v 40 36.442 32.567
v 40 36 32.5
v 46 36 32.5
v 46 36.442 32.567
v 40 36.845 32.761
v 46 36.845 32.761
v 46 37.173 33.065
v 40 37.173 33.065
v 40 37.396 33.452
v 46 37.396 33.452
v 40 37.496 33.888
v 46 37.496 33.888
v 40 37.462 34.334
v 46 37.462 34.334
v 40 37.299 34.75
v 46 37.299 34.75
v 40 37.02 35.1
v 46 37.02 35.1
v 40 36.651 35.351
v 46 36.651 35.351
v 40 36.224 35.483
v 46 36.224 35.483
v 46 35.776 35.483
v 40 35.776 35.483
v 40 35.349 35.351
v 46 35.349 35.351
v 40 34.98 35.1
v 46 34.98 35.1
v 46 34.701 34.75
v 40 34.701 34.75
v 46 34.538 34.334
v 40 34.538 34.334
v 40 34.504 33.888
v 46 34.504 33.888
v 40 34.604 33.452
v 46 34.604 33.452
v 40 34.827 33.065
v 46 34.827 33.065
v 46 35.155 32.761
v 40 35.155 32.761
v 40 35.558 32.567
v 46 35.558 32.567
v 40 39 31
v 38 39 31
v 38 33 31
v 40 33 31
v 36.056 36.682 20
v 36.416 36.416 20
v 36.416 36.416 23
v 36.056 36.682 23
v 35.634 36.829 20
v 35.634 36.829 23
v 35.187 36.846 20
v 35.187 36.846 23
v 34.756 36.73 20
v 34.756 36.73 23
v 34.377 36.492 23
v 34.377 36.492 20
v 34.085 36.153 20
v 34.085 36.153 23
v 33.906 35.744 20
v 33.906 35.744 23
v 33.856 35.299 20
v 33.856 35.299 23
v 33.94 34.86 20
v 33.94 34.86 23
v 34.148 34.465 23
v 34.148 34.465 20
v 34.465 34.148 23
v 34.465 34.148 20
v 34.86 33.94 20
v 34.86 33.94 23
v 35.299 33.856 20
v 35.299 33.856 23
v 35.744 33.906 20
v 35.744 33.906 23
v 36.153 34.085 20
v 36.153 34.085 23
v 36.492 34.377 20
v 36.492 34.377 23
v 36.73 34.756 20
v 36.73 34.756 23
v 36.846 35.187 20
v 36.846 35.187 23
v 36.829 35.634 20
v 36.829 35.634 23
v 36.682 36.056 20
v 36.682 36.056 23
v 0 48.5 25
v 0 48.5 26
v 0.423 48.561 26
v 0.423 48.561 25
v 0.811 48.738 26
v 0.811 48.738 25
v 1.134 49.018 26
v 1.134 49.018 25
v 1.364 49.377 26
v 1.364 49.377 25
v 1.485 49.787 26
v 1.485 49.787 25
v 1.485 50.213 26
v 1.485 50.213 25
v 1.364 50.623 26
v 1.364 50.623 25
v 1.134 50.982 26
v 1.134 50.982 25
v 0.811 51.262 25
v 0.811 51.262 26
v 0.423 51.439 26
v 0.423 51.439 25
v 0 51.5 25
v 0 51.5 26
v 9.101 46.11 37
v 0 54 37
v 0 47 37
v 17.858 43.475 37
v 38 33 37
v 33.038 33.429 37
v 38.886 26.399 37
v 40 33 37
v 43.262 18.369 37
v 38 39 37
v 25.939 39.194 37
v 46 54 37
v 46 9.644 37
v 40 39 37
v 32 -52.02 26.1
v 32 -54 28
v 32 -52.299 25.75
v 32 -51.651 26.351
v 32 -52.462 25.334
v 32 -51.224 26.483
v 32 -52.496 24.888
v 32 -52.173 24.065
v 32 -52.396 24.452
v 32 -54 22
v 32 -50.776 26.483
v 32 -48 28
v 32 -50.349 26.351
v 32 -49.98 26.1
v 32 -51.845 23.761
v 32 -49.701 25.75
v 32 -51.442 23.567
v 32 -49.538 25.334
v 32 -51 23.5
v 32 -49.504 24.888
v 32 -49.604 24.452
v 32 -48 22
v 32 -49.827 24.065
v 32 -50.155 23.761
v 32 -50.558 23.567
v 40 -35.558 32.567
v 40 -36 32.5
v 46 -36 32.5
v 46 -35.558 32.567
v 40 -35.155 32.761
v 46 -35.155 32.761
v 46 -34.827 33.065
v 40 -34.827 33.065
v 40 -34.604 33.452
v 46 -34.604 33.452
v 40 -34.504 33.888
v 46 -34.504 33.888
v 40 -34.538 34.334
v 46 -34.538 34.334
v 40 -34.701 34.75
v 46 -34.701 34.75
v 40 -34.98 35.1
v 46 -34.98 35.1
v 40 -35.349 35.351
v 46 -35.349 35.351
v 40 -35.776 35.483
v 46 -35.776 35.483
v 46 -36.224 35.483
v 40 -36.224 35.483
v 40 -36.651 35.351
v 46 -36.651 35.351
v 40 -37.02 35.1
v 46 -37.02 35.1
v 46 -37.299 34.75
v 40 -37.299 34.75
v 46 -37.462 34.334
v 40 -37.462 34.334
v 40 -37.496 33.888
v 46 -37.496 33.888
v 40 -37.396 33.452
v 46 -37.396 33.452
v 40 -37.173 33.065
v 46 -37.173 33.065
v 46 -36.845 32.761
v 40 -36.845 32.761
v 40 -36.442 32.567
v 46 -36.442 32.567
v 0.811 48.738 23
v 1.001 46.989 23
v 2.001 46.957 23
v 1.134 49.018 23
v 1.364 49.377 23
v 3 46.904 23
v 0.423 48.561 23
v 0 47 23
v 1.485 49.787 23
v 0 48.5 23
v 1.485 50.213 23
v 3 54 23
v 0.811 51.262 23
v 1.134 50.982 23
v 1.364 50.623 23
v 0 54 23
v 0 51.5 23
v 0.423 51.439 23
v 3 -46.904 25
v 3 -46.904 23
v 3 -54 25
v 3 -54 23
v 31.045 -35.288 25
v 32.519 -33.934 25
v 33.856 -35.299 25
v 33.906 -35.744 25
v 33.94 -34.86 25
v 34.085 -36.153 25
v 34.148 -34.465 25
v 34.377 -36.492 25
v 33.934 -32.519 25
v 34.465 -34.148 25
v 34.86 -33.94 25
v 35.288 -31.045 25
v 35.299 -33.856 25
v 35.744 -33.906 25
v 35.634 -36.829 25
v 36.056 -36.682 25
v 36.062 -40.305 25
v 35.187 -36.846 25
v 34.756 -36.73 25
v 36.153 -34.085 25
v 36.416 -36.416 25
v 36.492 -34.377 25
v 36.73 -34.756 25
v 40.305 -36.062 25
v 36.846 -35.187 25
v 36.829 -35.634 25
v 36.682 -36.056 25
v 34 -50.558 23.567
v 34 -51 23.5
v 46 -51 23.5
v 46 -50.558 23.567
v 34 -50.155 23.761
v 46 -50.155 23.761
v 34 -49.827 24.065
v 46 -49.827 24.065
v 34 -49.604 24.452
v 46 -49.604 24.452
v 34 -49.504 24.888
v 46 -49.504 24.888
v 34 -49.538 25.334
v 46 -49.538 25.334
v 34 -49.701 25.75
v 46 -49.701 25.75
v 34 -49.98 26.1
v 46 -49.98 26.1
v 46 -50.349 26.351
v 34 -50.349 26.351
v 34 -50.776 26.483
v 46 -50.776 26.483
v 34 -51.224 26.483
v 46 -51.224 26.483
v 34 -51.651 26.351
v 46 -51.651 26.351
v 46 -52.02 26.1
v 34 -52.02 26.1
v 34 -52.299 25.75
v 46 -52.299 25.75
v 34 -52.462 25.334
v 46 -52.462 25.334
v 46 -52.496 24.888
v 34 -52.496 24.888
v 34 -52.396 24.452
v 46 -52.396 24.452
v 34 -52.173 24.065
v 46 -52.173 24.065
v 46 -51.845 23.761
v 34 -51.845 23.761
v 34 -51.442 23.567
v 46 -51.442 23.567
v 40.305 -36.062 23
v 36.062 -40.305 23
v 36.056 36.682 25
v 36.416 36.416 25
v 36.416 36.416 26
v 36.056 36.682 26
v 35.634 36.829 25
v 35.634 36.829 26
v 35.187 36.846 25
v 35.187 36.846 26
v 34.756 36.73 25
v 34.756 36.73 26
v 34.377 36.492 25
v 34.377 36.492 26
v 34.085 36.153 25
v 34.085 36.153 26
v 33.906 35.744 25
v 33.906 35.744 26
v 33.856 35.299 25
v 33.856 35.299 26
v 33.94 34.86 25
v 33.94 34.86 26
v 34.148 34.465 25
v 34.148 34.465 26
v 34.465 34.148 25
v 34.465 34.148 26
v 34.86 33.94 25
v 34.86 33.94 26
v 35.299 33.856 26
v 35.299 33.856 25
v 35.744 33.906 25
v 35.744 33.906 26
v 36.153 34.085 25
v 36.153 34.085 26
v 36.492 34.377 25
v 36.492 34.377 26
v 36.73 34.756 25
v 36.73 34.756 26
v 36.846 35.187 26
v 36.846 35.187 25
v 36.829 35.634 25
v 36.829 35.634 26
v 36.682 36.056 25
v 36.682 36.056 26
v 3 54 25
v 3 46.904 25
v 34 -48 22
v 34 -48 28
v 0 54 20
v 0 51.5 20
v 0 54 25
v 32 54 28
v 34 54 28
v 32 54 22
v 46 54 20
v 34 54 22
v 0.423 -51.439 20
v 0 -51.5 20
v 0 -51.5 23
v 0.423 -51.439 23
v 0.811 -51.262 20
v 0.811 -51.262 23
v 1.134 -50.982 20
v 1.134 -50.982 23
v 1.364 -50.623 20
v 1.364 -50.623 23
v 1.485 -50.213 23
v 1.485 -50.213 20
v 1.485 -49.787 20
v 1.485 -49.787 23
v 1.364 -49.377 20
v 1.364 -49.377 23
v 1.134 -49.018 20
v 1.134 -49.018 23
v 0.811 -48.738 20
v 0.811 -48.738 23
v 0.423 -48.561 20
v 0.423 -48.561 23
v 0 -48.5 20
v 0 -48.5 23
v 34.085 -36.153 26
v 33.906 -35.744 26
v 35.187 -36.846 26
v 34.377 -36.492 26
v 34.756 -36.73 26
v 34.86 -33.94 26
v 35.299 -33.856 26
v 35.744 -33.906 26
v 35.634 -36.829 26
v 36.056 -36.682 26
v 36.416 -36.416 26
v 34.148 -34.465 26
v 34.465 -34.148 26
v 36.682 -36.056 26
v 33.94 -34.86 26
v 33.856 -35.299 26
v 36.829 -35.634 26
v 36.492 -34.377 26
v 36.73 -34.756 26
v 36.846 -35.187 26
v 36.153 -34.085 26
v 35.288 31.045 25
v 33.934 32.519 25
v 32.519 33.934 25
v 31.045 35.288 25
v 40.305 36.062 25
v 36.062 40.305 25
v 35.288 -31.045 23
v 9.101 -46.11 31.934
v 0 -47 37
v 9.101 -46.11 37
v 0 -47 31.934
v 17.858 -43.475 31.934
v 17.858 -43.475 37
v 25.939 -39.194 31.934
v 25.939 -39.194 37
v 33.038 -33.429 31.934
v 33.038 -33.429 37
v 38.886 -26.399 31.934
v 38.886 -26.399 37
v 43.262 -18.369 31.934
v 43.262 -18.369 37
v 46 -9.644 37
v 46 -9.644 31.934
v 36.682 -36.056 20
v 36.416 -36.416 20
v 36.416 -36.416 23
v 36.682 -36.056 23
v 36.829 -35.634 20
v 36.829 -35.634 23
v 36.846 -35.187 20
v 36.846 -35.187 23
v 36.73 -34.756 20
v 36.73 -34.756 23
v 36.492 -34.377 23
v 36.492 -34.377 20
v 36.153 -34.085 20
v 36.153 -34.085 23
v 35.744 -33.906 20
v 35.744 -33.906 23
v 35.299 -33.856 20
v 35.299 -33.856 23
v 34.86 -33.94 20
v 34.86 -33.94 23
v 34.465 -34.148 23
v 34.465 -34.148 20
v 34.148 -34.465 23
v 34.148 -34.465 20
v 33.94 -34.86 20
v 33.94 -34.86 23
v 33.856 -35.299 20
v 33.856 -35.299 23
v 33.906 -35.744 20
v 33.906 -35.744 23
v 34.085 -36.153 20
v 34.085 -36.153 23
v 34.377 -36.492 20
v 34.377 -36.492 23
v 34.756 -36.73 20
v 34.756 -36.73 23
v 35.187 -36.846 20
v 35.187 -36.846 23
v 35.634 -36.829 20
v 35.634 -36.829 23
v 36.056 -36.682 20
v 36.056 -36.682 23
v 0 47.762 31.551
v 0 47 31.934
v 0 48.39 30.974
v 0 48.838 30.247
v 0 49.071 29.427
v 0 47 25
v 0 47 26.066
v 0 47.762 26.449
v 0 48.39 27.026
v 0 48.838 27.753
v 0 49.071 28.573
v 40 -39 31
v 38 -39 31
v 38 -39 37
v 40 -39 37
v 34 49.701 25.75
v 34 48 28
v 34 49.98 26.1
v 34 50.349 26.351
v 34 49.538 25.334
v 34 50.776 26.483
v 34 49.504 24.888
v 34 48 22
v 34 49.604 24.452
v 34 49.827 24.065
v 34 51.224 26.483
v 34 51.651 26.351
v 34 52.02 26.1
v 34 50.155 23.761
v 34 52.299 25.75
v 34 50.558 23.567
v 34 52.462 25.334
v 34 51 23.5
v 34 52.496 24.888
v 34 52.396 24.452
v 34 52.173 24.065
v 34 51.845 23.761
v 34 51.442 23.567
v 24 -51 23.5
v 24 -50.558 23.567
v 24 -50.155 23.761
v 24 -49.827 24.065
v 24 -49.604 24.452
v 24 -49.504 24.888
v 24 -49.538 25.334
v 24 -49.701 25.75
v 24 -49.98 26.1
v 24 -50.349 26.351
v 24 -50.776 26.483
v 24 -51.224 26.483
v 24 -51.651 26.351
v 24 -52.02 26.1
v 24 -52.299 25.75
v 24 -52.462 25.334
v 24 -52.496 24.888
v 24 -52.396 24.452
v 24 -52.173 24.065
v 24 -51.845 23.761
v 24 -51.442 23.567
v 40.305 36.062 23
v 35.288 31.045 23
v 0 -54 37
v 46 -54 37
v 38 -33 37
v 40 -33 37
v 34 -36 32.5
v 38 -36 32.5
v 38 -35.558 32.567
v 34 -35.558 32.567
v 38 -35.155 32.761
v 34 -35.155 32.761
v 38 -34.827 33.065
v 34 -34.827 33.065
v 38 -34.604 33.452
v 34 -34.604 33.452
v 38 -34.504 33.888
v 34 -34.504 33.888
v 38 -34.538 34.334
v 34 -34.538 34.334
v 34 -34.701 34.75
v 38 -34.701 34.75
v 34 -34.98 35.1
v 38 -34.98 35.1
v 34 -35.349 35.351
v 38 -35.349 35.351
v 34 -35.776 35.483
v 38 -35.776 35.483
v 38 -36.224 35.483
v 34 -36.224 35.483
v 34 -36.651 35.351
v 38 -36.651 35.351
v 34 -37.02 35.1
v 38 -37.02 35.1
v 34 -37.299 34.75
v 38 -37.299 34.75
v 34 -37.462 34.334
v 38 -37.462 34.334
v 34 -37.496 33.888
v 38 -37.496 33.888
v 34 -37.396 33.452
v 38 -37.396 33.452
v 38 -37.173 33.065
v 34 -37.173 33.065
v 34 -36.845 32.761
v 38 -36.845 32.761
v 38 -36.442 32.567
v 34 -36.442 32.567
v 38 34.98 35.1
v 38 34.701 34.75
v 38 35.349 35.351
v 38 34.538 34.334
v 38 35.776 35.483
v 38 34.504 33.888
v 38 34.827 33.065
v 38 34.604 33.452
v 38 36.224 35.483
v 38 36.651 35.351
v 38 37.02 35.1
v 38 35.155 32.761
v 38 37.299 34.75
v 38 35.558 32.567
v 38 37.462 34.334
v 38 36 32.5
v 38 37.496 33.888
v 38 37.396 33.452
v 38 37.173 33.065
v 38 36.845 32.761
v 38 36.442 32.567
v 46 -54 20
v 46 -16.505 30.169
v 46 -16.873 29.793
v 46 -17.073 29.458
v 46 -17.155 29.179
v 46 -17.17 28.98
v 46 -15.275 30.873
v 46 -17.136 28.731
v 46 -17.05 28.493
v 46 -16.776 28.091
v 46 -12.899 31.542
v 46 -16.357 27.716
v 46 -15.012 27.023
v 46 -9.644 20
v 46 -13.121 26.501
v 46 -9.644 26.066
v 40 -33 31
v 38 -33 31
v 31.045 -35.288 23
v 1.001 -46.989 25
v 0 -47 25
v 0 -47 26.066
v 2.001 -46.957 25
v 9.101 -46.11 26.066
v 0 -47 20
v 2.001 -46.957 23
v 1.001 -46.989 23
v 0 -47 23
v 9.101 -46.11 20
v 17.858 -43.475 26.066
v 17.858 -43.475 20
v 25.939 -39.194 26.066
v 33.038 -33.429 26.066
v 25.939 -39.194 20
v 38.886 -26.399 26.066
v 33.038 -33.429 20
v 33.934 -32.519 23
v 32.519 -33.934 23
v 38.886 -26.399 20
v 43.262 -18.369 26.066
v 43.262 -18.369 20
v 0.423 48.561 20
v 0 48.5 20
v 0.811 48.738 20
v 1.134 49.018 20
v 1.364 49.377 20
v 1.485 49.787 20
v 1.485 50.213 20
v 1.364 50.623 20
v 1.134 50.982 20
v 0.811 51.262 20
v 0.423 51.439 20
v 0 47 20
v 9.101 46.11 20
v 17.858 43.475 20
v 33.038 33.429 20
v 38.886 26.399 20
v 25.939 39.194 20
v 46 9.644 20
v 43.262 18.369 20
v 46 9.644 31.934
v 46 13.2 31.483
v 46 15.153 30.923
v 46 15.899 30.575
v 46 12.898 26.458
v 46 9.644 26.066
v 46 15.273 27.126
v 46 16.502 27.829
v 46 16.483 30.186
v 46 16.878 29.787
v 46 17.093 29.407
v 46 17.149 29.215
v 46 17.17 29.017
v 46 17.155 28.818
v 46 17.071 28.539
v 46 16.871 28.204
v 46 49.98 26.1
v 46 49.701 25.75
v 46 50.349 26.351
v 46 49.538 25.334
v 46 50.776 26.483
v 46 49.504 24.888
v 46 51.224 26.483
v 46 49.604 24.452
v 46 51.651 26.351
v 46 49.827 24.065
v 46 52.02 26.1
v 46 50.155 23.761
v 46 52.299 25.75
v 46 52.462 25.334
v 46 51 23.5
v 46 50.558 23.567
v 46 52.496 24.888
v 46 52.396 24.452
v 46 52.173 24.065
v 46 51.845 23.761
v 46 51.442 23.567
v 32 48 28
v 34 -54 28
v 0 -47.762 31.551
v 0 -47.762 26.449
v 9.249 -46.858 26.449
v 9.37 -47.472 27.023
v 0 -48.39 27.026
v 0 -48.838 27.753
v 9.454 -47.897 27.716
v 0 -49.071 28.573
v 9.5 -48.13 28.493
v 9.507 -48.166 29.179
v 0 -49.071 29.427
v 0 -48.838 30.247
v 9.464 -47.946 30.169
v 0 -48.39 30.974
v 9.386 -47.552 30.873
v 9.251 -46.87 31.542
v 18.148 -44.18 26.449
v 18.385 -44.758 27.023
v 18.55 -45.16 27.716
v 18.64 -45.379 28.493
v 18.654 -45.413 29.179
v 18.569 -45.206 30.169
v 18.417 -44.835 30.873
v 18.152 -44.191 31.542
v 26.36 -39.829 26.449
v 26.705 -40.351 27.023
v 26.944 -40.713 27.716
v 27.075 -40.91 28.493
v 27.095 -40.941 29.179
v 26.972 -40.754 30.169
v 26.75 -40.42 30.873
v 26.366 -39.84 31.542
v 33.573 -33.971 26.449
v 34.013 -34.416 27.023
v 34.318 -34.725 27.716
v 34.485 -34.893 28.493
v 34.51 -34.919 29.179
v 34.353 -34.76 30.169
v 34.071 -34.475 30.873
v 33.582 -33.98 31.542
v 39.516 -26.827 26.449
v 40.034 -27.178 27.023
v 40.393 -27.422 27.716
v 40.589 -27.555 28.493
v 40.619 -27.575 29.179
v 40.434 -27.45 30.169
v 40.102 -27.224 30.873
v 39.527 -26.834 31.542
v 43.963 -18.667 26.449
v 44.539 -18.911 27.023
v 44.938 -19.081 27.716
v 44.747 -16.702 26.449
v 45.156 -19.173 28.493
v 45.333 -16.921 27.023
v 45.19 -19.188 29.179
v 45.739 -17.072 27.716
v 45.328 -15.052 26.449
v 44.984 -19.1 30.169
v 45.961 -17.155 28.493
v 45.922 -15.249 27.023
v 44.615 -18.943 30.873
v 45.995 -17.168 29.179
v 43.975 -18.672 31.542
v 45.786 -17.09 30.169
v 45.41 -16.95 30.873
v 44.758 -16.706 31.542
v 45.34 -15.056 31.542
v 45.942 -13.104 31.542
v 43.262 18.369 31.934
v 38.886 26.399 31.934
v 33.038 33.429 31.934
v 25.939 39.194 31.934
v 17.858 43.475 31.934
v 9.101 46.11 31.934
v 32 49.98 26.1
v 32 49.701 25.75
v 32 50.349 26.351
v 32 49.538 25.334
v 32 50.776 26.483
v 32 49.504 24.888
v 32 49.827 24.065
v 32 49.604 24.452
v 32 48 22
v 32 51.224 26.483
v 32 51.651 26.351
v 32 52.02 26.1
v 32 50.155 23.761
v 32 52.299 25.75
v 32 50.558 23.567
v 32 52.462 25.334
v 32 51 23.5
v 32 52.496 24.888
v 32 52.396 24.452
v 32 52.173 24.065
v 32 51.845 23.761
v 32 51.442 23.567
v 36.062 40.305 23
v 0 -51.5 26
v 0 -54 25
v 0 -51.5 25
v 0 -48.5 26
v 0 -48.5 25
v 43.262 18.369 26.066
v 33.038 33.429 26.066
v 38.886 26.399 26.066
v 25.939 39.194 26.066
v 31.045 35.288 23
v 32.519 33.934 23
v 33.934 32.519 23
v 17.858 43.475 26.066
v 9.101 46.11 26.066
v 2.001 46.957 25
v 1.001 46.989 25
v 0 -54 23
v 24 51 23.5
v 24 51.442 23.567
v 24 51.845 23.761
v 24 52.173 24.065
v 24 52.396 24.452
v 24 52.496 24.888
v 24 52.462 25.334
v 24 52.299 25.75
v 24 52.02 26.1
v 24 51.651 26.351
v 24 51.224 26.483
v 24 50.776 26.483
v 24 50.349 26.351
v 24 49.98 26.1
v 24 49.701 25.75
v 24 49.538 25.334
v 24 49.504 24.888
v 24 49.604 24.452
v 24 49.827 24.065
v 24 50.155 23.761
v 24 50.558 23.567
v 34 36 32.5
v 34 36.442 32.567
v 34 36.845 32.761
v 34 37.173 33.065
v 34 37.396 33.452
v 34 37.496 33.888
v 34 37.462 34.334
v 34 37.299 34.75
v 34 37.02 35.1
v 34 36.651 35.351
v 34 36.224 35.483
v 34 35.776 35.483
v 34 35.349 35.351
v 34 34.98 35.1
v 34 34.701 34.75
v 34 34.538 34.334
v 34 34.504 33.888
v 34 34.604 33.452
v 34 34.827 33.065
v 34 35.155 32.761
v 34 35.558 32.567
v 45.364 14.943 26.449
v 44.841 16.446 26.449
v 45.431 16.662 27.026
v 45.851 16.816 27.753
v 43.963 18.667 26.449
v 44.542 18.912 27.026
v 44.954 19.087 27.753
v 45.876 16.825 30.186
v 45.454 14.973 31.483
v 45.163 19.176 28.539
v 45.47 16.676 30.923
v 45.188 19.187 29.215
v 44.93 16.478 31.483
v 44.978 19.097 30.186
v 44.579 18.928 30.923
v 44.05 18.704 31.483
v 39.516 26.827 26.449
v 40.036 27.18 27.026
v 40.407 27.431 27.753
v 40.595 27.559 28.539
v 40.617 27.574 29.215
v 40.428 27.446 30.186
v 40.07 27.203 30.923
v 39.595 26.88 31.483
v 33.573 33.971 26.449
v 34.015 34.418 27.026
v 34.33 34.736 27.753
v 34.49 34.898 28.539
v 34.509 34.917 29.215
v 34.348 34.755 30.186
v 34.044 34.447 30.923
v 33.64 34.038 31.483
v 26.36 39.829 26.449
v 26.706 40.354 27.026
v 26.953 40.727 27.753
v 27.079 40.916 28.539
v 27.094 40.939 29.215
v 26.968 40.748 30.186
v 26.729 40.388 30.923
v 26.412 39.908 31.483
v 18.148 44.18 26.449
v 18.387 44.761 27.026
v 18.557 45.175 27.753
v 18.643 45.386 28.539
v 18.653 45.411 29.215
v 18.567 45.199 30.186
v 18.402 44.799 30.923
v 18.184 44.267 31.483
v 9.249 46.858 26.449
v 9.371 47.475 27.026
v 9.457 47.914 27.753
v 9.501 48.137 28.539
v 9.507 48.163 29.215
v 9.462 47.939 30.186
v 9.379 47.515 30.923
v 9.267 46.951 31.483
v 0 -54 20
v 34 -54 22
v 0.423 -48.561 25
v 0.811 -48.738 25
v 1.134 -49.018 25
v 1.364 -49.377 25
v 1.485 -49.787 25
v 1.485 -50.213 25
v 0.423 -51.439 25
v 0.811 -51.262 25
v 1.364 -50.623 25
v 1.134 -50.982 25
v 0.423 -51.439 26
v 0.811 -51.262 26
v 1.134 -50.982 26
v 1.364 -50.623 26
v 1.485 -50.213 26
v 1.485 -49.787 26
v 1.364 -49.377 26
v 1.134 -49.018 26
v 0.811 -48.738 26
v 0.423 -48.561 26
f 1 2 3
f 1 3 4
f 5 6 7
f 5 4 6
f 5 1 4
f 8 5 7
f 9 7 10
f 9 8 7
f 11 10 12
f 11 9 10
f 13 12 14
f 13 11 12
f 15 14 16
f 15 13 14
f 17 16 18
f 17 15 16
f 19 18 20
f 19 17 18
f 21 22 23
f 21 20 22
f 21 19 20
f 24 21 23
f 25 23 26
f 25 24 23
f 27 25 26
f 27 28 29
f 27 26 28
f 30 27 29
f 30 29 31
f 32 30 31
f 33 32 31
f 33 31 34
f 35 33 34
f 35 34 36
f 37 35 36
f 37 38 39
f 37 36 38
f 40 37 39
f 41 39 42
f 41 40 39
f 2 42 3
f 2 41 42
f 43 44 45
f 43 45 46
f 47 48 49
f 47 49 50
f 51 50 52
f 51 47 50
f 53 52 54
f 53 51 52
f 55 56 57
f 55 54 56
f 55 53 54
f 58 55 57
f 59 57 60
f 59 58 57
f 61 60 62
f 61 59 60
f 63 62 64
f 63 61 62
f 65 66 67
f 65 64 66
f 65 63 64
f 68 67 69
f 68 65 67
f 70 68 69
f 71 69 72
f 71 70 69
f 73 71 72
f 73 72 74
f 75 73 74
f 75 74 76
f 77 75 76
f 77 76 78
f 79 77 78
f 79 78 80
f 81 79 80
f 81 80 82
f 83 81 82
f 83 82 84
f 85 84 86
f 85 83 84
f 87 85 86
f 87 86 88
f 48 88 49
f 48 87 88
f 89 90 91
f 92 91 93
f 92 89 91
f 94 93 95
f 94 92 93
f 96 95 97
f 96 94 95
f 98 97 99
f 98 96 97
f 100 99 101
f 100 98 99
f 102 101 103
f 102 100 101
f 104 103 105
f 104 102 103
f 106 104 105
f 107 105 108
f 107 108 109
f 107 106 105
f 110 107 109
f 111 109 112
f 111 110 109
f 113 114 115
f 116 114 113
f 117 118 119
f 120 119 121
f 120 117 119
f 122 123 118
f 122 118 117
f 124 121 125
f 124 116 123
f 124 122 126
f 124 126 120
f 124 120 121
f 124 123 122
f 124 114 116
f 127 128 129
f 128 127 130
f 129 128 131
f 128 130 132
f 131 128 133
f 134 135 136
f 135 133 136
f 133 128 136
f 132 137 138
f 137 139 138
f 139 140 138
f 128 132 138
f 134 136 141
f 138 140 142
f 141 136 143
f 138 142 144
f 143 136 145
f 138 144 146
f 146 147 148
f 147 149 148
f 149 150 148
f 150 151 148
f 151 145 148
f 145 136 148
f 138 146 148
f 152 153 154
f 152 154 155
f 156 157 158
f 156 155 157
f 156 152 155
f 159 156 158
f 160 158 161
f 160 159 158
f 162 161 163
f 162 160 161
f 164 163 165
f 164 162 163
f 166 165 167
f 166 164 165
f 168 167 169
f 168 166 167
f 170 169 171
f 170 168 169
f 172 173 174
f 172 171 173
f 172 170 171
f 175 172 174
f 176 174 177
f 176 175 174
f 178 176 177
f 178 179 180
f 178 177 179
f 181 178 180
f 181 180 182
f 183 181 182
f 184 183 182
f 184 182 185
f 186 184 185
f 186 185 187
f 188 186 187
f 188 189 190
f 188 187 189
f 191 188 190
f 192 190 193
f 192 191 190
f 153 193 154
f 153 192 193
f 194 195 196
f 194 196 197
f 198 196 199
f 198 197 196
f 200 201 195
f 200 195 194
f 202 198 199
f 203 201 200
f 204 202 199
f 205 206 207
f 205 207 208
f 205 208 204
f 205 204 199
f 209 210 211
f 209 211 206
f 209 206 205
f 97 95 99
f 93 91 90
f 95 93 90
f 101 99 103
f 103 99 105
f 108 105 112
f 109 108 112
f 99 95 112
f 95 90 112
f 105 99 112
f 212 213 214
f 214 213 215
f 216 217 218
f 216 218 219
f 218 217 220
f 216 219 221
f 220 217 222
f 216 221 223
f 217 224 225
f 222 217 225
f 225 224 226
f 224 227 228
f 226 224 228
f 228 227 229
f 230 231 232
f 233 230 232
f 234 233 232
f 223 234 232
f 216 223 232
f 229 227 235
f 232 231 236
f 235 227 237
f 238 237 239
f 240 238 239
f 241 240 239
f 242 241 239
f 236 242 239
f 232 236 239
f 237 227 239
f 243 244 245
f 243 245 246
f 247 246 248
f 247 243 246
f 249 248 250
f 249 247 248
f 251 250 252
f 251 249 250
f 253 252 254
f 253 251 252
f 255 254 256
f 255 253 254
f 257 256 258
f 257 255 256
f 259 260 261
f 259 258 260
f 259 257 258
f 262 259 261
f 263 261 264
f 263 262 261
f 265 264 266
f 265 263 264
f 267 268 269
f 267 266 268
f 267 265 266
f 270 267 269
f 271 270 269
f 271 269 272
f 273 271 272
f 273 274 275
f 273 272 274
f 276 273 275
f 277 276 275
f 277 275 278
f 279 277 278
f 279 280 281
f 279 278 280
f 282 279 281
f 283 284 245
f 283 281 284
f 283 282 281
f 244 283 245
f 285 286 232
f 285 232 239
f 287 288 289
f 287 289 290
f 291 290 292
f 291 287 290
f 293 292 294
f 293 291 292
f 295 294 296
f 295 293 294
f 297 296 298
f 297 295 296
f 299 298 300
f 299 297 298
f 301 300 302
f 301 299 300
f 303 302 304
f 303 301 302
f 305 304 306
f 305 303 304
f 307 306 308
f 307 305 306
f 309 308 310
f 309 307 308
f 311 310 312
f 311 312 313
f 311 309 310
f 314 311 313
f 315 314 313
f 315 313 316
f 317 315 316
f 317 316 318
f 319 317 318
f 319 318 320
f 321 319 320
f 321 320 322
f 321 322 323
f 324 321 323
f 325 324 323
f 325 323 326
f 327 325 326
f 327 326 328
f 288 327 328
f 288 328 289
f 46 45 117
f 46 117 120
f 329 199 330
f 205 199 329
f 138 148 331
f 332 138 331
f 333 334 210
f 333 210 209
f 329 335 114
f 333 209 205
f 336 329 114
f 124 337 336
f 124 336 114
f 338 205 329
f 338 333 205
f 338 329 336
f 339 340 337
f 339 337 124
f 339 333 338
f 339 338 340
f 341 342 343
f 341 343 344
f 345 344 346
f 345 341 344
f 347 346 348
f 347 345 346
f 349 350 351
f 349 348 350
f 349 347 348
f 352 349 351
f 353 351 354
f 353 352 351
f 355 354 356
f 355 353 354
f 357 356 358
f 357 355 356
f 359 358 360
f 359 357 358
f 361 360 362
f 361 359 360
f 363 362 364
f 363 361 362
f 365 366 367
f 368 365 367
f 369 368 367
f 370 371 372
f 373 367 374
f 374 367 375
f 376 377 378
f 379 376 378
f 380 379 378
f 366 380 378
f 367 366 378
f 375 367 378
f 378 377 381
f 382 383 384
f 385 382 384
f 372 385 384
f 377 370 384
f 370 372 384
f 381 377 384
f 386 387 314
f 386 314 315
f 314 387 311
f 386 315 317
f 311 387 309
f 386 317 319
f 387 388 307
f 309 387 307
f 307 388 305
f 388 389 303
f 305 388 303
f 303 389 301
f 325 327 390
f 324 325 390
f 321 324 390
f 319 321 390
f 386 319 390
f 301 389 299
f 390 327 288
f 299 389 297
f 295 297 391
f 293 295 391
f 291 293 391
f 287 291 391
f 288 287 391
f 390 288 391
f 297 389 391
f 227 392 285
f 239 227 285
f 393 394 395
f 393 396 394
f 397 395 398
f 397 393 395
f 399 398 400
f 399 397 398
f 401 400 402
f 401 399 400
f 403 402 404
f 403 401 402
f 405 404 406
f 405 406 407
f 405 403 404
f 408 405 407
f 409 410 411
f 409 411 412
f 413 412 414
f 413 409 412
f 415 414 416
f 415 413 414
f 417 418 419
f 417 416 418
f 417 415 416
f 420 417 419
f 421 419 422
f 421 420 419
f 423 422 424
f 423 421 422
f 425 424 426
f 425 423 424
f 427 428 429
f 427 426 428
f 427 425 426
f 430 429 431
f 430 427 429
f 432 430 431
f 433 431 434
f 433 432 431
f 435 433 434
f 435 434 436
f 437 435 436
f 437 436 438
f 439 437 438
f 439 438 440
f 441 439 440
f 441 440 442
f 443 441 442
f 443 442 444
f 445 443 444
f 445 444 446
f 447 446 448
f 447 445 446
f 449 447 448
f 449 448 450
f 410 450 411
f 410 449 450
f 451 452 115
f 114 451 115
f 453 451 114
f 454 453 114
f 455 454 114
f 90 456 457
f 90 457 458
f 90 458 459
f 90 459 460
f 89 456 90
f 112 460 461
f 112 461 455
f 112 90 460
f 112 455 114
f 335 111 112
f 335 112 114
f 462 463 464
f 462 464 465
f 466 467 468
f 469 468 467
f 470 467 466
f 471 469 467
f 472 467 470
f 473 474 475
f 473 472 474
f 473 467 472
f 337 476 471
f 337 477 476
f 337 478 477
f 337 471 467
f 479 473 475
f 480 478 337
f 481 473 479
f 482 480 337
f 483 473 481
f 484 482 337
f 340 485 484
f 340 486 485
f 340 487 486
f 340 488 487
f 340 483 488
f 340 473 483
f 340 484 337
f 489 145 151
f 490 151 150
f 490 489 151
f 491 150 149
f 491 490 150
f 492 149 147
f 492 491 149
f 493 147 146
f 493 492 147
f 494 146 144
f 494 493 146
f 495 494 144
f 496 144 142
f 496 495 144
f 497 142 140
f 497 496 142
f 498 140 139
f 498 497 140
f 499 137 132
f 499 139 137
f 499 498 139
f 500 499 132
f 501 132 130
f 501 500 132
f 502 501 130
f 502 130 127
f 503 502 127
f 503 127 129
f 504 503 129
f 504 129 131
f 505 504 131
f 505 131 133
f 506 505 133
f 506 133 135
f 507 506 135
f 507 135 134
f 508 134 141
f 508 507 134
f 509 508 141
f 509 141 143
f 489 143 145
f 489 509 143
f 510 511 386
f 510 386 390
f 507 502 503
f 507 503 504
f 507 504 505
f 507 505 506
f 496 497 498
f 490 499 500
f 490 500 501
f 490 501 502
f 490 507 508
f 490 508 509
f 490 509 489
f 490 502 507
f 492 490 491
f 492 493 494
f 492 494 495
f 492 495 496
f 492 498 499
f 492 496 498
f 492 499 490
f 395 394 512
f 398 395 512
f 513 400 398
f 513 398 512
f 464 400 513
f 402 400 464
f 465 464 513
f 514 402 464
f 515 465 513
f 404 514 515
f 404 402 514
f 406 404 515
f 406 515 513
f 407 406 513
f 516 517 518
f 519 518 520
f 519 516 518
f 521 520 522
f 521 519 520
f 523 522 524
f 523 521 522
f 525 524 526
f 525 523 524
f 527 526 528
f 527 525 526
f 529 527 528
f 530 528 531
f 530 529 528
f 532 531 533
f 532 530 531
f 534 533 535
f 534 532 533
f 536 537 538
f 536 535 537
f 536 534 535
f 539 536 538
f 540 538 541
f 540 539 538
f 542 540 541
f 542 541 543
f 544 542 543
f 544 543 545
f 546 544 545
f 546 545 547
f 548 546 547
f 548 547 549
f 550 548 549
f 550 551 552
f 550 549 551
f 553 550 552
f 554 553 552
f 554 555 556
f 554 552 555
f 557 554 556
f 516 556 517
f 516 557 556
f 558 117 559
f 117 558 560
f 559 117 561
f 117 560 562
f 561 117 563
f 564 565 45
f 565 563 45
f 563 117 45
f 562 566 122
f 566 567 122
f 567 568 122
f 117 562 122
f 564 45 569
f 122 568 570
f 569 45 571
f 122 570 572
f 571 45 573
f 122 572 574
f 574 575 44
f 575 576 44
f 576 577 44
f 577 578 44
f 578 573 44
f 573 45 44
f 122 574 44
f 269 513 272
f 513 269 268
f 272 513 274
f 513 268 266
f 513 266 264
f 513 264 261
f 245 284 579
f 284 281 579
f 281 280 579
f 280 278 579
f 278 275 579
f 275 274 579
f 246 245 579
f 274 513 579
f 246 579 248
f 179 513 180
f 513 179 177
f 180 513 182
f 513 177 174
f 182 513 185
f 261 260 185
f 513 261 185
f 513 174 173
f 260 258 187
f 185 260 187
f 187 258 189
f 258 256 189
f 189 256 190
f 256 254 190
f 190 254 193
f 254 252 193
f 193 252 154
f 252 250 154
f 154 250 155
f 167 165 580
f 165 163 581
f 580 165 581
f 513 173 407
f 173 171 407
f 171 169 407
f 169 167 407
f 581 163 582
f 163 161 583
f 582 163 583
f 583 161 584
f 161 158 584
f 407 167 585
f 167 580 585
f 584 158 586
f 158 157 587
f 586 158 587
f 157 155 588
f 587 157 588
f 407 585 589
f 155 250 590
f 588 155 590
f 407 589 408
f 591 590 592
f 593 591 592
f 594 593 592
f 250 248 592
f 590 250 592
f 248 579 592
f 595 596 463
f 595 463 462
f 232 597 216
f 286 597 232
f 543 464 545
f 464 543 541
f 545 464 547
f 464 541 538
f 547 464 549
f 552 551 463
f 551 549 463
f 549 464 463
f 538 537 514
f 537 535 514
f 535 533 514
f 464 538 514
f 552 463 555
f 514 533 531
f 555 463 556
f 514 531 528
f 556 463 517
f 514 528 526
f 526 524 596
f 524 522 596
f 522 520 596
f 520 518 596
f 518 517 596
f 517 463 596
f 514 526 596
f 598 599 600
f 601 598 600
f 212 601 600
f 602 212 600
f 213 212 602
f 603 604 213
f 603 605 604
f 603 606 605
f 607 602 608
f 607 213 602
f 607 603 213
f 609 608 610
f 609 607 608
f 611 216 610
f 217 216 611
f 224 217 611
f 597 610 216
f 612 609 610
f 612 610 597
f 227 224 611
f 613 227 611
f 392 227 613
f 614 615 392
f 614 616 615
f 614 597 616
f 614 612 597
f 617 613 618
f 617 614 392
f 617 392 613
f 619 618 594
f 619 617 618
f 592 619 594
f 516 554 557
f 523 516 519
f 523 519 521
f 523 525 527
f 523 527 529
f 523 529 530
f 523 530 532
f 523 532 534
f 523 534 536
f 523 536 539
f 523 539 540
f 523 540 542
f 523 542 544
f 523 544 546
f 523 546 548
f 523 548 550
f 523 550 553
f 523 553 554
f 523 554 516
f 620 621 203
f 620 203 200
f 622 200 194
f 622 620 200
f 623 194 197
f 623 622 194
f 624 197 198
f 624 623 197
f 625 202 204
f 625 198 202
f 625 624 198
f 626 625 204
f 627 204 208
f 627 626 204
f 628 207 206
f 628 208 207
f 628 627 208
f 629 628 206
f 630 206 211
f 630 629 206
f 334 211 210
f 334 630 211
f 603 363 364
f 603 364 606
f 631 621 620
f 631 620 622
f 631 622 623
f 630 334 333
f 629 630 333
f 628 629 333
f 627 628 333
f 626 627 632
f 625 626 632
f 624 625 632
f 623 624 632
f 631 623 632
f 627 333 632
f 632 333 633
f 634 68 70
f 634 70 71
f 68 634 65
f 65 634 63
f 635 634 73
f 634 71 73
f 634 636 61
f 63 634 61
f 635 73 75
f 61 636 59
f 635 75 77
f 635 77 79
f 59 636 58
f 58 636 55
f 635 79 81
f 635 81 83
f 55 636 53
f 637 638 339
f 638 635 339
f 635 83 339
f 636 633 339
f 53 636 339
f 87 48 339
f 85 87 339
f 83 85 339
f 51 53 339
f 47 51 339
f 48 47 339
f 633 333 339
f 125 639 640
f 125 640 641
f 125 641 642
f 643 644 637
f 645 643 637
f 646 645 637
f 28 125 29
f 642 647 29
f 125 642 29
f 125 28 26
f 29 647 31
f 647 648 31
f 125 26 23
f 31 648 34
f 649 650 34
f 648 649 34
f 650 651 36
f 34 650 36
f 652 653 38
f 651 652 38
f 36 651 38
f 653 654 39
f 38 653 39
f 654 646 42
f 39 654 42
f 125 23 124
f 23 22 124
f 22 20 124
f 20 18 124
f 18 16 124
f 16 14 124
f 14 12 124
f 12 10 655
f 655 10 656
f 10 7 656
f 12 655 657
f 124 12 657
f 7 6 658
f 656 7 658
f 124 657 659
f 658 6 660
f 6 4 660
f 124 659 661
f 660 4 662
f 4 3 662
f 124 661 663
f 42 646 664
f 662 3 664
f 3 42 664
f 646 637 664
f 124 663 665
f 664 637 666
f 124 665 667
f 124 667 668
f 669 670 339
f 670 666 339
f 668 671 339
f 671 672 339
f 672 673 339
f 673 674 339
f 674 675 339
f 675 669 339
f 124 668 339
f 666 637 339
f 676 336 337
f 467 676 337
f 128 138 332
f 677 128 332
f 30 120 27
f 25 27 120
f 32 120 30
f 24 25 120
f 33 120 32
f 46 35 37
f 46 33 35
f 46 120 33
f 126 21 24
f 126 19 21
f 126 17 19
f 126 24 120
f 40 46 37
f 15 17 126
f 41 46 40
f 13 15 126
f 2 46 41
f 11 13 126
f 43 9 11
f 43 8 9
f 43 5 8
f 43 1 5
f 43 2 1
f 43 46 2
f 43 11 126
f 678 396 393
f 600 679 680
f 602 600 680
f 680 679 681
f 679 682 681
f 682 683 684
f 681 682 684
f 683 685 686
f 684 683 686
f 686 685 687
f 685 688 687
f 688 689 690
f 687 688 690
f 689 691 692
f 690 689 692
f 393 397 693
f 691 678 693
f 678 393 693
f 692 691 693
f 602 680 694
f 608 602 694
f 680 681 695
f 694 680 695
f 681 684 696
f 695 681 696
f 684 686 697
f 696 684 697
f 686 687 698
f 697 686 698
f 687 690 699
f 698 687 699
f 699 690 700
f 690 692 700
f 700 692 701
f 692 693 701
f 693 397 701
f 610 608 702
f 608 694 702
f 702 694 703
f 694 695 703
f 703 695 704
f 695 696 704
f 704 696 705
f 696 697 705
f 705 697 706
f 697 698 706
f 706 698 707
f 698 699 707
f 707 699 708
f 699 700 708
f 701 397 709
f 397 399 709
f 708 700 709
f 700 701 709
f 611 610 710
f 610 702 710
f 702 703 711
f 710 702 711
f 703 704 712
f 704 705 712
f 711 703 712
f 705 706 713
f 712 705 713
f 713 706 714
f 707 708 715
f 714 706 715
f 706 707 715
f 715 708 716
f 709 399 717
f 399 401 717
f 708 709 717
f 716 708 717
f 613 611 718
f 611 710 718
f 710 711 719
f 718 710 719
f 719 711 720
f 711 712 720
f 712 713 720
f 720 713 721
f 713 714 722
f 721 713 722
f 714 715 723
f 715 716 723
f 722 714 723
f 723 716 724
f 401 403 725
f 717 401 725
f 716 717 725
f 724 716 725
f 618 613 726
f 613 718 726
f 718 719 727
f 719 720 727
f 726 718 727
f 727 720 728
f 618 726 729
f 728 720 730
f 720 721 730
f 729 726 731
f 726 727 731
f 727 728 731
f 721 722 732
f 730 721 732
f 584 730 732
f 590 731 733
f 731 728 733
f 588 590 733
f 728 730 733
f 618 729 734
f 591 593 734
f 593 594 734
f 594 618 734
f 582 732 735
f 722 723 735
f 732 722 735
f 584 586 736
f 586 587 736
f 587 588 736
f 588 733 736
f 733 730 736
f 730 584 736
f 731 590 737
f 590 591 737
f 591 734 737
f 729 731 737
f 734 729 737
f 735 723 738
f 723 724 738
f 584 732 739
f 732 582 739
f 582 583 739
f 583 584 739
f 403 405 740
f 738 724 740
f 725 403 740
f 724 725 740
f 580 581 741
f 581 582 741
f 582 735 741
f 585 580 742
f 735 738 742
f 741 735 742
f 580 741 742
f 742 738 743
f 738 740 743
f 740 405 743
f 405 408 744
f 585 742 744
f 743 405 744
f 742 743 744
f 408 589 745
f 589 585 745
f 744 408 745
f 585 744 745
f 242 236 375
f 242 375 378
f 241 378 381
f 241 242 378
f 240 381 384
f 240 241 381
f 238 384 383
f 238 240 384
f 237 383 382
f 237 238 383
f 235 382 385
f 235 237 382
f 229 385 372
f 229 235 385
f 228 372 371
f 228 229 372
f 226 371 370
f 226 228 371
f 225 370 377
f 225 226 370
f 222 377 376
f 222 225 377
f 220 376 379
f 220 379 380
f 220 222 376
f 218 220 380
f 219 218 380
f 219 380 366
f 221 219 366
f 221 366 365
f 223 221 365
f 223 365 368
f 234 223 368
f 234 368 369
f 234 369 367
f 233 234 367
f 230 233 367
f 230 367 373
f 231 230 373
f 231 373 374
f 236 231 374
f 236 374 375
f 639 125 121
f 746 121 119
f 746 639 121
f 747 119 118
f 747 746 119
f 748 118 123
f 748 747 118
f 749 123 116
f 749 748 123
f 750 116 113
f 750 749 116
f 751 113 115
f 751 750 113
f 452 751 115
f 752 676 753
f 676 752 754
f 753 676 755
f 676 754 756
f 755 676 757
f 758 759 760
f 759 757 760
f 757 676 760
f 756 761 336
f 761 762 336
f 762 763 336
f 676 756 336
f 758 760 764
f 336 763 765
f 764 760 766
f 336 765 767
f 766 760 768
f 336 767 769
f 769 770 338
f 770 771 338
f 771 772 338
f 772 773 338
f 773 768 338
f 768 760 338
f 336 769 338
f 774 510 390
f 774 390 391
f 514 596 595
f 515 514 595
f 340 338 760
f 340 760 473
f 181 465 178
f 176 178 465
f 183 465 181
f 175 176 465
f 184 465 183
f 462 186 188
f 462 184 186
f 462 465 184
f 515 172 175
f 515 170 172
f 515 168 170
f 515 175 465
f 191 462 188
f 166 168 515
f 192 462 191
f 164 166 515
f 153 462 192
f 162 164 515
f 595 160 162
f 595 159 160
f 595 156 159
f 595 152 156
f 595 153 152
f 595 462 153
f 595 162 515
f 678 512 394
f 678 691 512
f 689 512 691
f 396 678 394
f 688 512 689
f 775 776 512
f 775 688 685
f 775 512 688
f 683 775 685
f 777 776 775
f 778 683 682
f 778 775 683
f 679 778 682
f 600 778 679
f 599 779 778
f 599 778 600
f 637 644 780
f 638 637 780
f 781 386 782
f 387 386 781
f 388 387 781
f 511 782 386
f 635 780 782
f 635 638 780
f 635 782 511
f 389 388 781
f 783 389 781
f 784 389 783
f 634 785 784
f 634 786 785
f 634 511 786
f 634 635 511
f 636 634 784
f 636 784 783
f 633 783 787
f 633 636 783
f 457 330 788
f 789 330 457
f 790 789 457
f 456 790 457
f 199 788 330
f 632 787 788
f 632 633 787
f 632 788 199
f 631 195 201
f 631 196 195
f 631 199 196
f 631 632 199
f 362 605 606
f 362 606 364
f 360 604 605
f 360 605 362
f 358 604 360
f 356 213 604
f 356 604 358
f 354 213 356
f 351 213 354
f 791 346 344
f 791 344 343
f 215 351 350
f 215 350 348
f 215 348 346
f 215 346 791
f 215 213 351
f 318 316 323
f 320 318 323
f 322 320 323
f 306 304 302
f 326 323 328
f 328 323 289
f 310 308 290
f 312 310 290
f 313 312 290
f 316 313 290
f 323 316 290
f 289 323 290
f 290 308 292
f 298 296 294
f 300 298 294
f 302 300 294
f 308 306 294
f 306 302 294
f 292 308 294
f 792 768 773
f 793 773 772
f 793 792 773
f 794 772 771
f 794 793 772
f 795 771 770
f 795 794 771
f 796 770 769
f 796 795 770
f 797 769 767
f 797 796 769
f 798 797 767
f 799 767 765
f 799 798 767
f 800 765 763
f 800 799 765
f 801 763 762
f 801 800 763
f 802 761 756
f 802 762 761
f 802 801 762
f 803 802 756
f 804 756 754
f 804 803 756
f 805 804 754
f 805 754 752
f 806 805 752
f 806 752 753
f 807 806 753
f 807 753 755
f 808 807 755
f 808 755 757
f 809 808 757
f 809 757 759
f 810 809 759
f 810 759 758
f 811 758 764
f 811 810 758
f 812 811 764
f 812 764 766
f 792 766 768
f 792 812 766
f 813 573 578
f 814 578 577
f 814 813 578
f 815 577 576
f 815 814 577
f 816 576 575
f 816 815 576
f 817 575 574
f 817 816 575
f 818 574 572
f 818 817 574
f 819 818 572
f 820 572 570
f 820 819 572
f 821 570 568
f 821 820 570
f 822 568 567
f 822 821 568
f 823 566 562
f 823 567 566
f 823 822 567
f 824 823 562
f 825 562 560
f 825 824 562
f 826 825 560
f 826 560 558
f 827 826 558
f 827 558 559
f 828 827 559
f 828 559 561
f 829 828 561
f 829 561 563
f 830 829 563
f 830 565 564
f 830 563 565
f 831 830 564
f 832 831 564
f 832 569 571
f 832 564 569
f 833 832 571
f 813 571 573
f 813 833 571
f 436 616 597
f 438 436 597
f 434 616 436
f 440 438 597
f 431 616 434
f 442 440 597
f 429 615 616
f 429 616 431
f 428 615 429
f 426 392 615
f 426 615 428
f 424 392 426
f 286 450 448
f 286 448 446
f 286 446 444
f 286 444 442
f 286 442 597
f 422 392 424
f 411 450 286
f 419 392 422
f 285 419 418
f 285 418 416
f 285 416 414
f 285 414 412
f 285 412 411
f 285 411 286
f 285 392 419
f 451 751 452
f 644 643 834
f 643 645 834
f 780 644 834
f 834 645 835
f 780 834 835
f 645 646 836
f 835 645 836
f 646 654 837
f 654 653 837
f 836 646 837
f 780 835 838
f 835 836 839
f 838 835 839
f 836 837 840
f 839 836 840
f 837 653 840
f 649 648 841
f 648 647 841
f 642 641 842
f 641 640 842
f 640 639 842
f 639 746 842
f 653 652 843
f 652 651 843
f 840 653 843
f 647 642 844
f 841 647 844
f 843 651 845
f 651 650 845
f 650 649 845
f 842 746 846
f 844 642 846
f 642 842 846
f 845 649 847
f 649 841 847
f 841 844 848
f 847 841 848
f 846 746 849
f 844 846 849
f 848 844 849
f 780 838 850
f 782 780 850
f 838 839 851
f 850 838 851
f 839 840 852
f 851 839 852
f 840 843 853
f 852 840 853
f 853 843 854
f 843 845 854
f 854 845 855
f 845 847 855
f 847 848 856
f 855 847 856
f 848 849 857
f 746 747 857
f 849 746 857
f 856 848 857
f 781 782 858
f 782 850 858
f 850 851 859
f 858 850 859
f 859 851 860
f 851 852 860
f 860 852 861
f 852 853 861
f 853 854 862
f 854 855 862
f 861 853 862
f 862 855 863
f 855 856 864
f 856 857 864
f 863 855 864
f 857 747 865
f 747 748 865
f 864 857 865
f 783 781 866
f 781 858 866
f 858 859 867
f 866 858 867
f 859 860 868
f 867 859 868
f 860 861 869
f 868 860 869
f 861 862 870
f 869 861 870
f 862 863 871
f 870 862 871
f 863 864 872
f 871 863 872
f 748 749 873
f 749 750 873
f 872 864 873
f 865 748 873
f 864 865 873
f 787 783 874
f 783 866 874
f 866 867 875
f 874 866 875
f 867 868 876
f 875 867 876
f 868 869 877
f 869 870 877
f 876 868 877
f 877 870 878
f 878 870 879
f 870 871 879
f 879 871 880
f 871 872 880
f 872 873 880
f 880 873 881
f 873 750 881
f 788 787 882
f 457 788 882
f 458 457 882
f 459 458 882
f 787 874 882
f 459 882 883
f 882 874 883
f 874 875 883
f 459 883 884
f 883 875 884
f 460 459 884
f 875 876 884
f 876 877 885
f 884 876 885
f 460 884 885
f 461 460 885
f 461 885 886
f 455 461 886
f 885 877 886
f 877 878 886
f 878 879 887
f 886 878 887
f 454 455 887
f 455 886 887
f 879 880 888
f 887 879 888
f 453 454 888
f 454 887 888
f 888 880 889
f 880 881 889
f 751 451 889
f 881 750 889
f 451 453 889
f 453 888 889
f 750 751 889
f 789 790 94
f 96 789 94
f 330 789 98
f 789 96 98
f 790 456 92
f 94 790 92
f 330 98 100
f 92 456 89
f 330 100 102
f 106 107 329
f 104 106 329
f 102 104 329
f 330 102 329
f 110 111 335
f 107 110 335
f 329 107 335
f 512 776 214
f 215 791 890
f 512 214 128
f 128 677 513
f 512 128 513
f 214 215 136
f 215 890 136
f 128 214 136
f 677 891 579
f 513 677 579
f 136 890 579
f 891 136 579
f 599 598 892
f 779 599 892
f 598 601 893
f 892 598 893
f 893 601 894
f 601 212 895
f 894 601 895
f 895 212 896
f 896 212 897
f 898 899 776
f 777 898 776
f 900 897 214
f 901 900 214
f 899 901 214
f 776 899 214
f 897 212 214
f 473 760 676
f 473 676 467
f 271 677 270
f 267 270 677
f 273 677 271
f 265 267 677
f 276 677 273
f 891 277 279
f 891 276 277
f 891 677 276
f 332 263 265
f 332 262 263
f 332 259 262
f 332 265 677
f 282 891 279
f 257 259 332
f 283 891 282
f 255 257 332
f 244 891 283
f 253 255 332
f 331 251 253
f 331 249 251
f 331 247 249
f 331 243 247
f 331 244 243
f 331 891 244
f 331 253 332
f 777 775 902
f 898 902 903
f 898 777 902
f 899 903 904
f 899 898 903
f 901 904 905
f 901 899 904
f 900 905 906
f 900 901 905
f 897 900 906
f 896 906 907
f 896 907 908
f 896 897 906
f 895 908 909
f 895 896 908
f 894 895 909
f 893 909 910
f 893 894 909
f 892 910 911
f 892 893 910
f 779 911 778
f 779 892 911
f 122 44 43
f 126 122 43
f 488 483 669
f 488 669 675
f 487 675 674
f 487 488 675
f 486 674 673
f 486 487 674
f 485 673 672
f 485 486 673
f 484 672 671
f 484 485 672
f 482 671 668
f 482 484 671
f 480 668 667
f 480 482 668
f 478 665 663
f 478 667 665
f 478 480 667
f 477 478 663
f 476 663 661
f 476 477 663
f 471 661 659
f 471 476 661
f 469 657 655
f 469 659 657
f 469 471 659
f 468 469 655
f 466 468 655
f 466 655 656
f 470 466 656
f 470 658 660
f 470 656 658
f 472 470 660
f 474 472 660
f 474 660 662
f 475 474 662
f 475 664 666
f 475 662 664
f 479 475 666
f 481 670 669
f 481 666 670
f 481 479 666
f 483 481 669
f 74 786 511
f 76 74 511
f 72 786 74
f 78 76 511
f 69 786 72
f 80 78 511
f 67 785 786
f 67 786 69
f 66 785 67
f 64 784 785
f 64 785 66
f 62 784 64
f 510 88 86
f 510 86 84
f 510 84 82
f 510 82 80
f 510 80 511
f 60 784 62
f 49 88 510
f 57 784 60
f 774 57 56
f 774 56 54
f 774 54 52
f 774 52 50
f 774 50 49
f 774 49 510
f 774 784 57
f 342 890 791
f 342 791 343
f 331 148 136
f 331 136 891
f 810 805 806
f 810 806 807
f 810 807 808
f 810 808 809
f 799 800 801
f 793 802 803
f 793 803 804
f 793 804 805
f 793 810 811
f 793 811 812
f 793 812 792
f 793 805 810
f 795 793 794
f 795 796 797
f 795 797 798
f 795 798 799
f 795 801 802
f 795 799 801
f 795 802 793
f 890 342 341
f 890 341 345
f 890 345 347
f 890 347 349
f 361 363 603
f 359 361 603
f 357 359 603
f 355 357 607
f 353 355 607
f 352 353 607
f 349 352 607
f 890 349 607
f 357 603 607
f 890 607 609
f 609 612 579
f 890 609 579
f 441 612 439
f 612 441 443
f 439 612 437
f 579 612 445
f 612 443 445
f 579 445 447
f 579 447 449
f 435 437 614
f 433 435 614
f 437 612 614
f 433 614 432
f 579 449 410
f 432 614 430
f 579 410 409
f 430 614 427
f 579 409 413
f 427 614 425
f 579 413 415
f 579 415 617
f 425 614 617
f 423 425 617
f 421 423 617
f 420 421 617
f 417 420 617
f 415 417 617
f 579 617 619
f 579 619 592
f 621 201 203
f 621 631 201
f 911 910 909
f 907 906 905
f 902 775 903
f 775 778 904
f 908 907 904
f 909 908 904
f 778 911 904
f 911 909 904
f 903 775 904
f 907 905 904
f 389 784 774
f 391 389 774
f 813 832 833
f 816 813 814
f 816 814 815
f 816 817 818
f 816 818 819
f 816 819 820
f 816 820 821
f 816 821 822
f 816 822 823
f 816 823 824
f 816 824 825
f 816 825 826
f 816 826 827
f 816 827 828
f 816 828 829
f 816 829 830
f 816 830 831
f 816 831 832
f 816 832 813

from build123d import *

# Parameters (mm, degrees)
BOX178_W                    = 2
BOX178_H                    = 6
BOX178_DEPTH                = 6
BOX179_W                    = 2
BOX179_H                    = 6
BOX179_DEPTH                = 6
BOX180_W                    = 2
BOX180_H                    = 6
BOX180_DEPTH                = 6
BOX177_W                    = 2
BOX177_H                    = 6
BOX177_DEPTH                = 6
CYLINDER392_R               = 1.5
CYLINDER392_DEPTH           = 100
CYLINDER393_R               = 1.5
CYLINDER393_DEPTH           = 100
CYLINDER394_R               = 1.5
CYLINDER394_DEPTH           = 100
CYLINDER391_R               = 1.5
CYLINDER391_DEPTH           = 100
BOX171_W                    = 8
BOX171_H                    = 6
BOX171_DEPTH                = 2
BOX171_PLACEMENT_ANGLE      = 45
BOX165_W                    = 8
BOX165_H                    = 6
BOX165_DEPTH                = 2
BOX166_W                    = 8
BOX166_H                    = 6
BOX166_DEPTH                = 2
BOX166_PLACEMENT_ANGLE      = 135
BOX168_W                    = 8
BOX168_H                    = 6
BOX168_DEPTH                = 2
BOX169_W                    = 8
BOX169_H                    = 6
BOX169_DEPTH                = 2
BOX169_PLACEMENT_ANGLE      = 225
BOX172_W                    = 8
BOX172_H                    = 6
BOX172_DEPTH                = 2
BOX170_W                    = 8
BOX170_H                    = 6
BOX170_DEPTH                = 2
BOX170_PLACEMENT_ANGLE      = 45
BOX167_W                    = 8
BOX167_H                    = 6
BOX167_DEPTH                = 2
CYLINDER375_R               = 1.5
CYLINDER375_DEPTH           = 50
CYLINDER375_PLACEMENT_ANGLE = 45
CYLINDER376_R               = 1.5
CYLINDER376_DEPTH           = 50
CYLINDER377_R               = 1.5
CYLINDER377_DEPTH           = 50
CYLINDER377_PLACEMENT_ANGLE = 135
CYLINDER378_R               = 1.5
CYLINDER378_DEPTH           = 50
CYLINDER379_R               = 1.5
CYLINDER379_DEPTH           = 50
CYLINDER379_PLACEMENT_ANGLE = 225
CYLINDER380_R               = 1.5
CYLINDER380_DEPTH           = 50
CYLINDER381_R               = 1.5
CYLINDER381_DEPTH           = 50
CYLINDER381_PLACEMENT_ANGLE = 45
CYLINDER374_R               = 1.5
CYLINDER374_DEPTH           = 50
TORUS005_R                  = 3.1
CYLINDER_R                  = 47
CYLINDER_DEPTH              = 17
BOX156_W                    = 46
BOX156_H                    = 108
BOX156_DEPTH                = 17


with BuildPart() as krychle178:
    # Box178 → Box178 (new body)
    with BuildSketch(Plane(origin=(32, -54, 22), x_dir=(1, 0, 0), z_dir=(0, 0, 1))):
        with Locations((1, 3)):
            Rectangle(BOX178_W, BOX178_H)
    extrude(amount=BOX178_DEPTH)


with BuildPart() as krychle179:
    # Box179 → Box179 (new body)
    with BuildSketch(Plane(origin=(38, 33, 31), x_dir=(1, 0, 0), z_dir=(0, 0, 1))):
        with Locations((1, 3)):
            Rectangle(BOX179_W, BOX179_H)
    extrude(amount=BOX179_DEPTH)


with BuildPart() as krychle180:
    # Box180 → Box180 (new body)
    with BuildSketch(Plane(origin=(38, -39, 31), x_dir=(1, 0, 0), z_dir=(0, 0, 1))):
        with Locations((1, 3)):
            Rectangle(BOX180_W, BOX180_H)
    extrude(amount=BOX180_DEPTH)


with BuildPart() as compound304:
    # Box177 → Box177 (new body)
    with BuildSketch(Plane(origin=(32, 48, 22), x_dir=(1, 0, 0), z_dir=(0, 0, 1))):
        with Locations((1, 3)):
            Rectangle(BOX177_W, BOX177_H)
    extrude(amount=BOX177_DEPTH)

    # Compound304: union Krychle178, Krychle179, Krychle180
    add(krychle178.part)
    add(krychle179.part)
    add(krychle180.part)


with BuildPart() as v_lec392:
    # Cylinder392 → Cylinder392 (new body)
    with BuildSketch(Plane(origin=(24, -51, 25), x_dir=(0, 0, -1), z_dir=(1, 0, 0))):
        Circle(CYLINDER392_R)
    extrude(amount=CYLINDER392_DEPTH)


with BuildPart() as v_lec393:
    # Cylinder393 → Cylinder393 (new body)
    with BuildSketch(Plane(origin=(34, 36, 34), x_dir=(0, 0, -1), z_dir=(1, 0, 0))):
        Circle(CYLINDER393_R)
    extrude(amount=CYLINDER393_DEPTH)


with BuildPart() as v_lec394:
    # Cylinder394 → Cylinder394 (new body)
    with BuildSketch(Plane(origin=(34, -36, 34), x_dir=(0, 0, -1), z_dir=(1, 0, 0))):
        Circle(CYLINDER394_R)
    extrude(amount=CYLINDER394_DEPTH)


with BuildPart() as compound301:
    # Cylinder391 → Cylinder391 (new body)
    with BuildSketch(Plane(origin=(24, 51, 25), x_dir=(0, 0, -1), z_dir=(1, 0, 0))):
        Circle(CYLINDER391_R)
    extrude(amount=CYLINDER391_DEPTH)

    # Compound301: union Válec392, Válec393, Válec394
    add(v_lec392.part)
    add(v_lec393.part)
    add(v_lec394.part)


with BuildPart() as krychle171:
    # Box171 → Box171 (new body)
    with BuildSketch(Plane.XY):
        with Locations((4, 3)):
            Rectangle(BOX171_W, BOX171_H)
    extrude(amount=BOX171_DEPTH)


with BuildPart() as krychle171_1:
    # Box171 placement: moved
    add(krychle171.part.moved(Location((34.648232, 30.405592, 23))).rotate(Axis((34.648232, 30.405592, 23), (0, 0, 1)), BOX171_PLACEMENT_ANGLE))


with BuildPart() as krychle165:
    # Box165 → Box165 (new body)
    with BuildSketch(Plane(origin=(3, 46, 23), x_dir=(0, 1, 0), z_dir=(0, 0, 1))):
        with Locations((4, 3)):
            Rectangle(BOX165_W, BOX165_H)
    extrude(amount=BOX165_DEPTH)


with BuildPart() as krychle166:
    # Box166 → Box166 (new body)
    with BuildSketch(Plane.XY):
        with Locations((4, 3)):
            Rectangle(BOX166_W, BOX166_H)
    extrude(amount=BOX166_DEPTH)


with BuildPart() as krychle166_1:
    # Box166 placement: moved
    add(krychle166.part.moved(Location((-30.405592, 34.648232, 23))).rotate(Axis((-30.405592, 34.648232, 23), (0, 0, 1)), BOX166_PLACEMENT_ANGLE))


with BuildPart() as krychle168:
    # Box168 → Box168 (new body)
    with BuildSketch(Plane(origin=(-46, 3, 23), x_dir=(-1, 0, 0), z_dir=(0, 0, 1))):
        with Locations((4, 3)):
            Rectangle(BOX168_W, BOX168_H)
    extrude(amount=BOX168_DEPTH)


with BuildPart() as krychle169:
    # Box169 → Box169 (new body)
    with BuildSketch(Plane.XY):
        with Locations((4, 3)):
            Rectangle(BOX169_W, BOX169_H)
    extrude(amount=BOX169_DEPTH)


with BuildPart() as krychle169_1:
    # Box169 placement: moved
    add(krychle169.part.moved(Location((-34.648232, -30.405592, 23))).rotate(Axis((-34.648232, -30.405592, 23), (0, 0, 1)), BOX169_PLACEMENT_ANGLE))


with BuildPart() as krychle172:
    # Box172 → Box172 (new body)
    with BuildSketch(Plane(origin=(-3, -46, 23), x_dir=(0, -1, 0), z_dir=(0, 0, 1))):
        with Locations((4, 3)):
            Rectangle(BOX172_W, BOX172_H)
    extrude(amount=BOX172_DEPTH)


with BuildPart() as krychle170:
    # Box170 → Box170 (new body)
    with BuildSketch(Plane.XY):
        with Locations((4, 3)):
            Rectangle(BOX170_W, BOX170_H)
    extrude(amount=BOX170_DEPTH)


with BuildPart() as krychle170_1:
    # Box170 placement: moved
    add(krychle170.part.moved(Location((30.405592, -34.648232, 23))).rotate(Axis((30.405592, -34.648232, 23), (0, 0, -1)), BOX170_PLACEMENT_ANGLE))


with BuildPart() as compound300:
    # Box167 → Box167 (new body)
    with BuildSketch(Plane(origin=(46, -3, 23), x_dir=(1, 0, 0), z_dir=(0, 0, 1))):
        with Locations((4, 3)):
            Rectangle(BOX167_W, BOX167_H)
    extrude(amount=BOX167_DEPTH)

    # Compound300: union Krychle171, Krychle165, Krychle166, Krychle168, Krychle169, Krychle172, Krychle170
    add(krychle171_1.part)
    add(krychle165.part)
    add(krychle166_1.part)
    add(krychle168.part)
    add(krychle169_1.part)
    add(krychle172.part)
    add(krychle170_1.part)


with BuildPart() as v_lec375:
    # Cylinder375 → Cylinder375 (new body)
    with BuildSketch(Plane.XY):
        Circle(CYLINDER375_R)
    extrude(amount=CYLINDER375_DEPTH)


with BuildPart() as v_lec375_1:
    # Cylinder375 placement: moved
    add(v_lec375.part.moved(Location((35.355339, 35.355339, -15))).rotate(Axis((35.355339, 35.355339, -15), (0, 0, 1)), CYLINDER375_PLACEMENT_ANGLE))


with BuildPart() as v_lec376:
    # Cylinder376 → Cylinder376 (new body)
    with BuildSketch(Plane(origin=(0, 50, -15), x_dir=(0, 1, 0), z_dir=(0, 0, 1))):
        Circle(CYLINDER376_R)
    extrude(amount=CYLINDER376_DEPTH)


with BuildPart() as v_lec377:
    # Cylinder377 → Cylinder377 (new body)
    with BuildSketch(Plane.XY):
        Circle(CYLINDER377_R)
    extrude(amount=CYLINDER377_DEPTH)


with BuildPart() as v_lec377_1:
    # Cylinder377 placement: moved
    add(v_lec377.part.moved(Location((-35.355339, 35.355339, -15))).rotate(Axis((-35.355339, 35.355339, -15), (0, 0, 1)), CYLINDER377_PLACEMENT_ANGLE))


with BuildPart() as v_lec378:
    # Cylinder378 → Cylinder378 (new body)
    with BuildSketch(Plane(origin=(-50, 0, -15), x_dir=(-1, 0, 0), z_dir=(0, 0, 1))):
        Circle(CYLINDER378_R)
    extrude(amount=CYLINDER378_DEPTH)


with BuildPart() as v_lec379:
    # Cylinder379 → Cylinder379 (new body)
    with BuildSketch(Plane.XY):
        Circle(CYLINDER379_R)
    extrude(amount=CYLINDER379_DEPTH)


with BuildPart() as v_lec379_1:
    # Cylinder379 placement: moved
    add(v_lec379.part.moved(Location((-35.355339, -35.355339, -15))).rotate(Axis((-35.355339, -35.355339, -15), (0, 0, 1)), CYLINDER379_PLACEMENT_ANGLE))


with BuildPart() as v_lec380:
    # Cylinder380 → Cylinder380 (new body)
    with BuildSketch(Plane(origin=(0, -50, -15), x_dir=(0, -1, 0), z_dir=(0, 0, 1))):
        Circle(CYLINDER380_R)
    extrude(amount=CYLINDER380_DEPTH)


with BuildPart() as v_lec381:
    # Cylinder381 → Cylinder381 (new body)
    with BuildSketch(Plane.XY):
        Circle(CYLINDER381_R)
    extrude(amount=CYLINDER381_DEPTH)


with BuildPart() as v_lec381_1:
    # Cylinder381 placement: moved
    add(v_lec381.part.moved(Location((35.355339, -35.355339, -15))).rotate(Axis((35.355339, -35.355339, -15), (0, 0, -1)), CYLINDER381_PLACEMENT_ANGLE))


with BuildPart() as compound298:
    # Cylinder374 → Cylinder374 (new body)
    with BuildSketch(Plane(origin=(50, 0, -15), x_dir=(1, 0, 0), z_dir=(0, 0, 1))):
        Circle(CYLINDER374_R)
    extrude(amount=CYLINDER374_DEPTH)

    # Compound298: union Válec375, Válec376, Válec377, Válec378, Válec379, Válec380, Válec381
    add(v_lec375_1.part)
    add(v_lec376.part)
    add(v_lec377_1.part)
    add(v_lec378.part)
    add(v_lec379_1.part)
    add(v_lec380.part)
    add(v_lec381_1.part)


with BuildPart() as compound298_1:
    # Compound298 placement: moved
    add(compound298.part.moved(Location((0, 0, -9))))


with BuildPart() as anuloid005:
    # Torus005 → Torus005 (revolve)
    with BuildSketch(Plane(origin=(0, 0, 29), x_dir=(1, 0, 0), z_dir=(0, -1, 0))):
        with Locations((46, 0)):
            Circle(TORUS005_R)
    revolve(axis=Axis((0, 0, 29), (0, 0, 1)))


with BuildPart() as v_lec:
    # Cylinder → Cylinder (new body)
    with BuildSketch(Plane.XY.offset(20)):
        Circle(CYLINDER_R)
    extrude(amount=CYLINDER_DEPTH)


with BuildPart() as cut158:
    # Box156 → Box156 (new body)
    with BuildSketch(Plane(origin=(0, -54, 20), x_dir=(1, 0, 0), z_dir=(0, 0, 1))):
        with Locations((23, 54)):
            Rectangle(BOX156_W, BOX156_H)
    extrude(amount=BOX156_DEPTH)

    # Cut153: cut Válec
    add(v_lec.part, mode=Mode.SUBTRACT)

    # Cut154: cut Anuloid005
    add(anuloid005.part, mode=Mode.SUBTRACT)

    # Cut155: cut Compound298
    add(compound298_1.part, mode=Mode.SUBTRACT)

    # Cut156: cut Compound300
    add(compound300.part, mode=Mode.SUBTRACT)

    # Cut157: cut Compound301
    add(compound301.part, mode=Mode.SUBTRACT)

    # Cut158: cut Compound304
    add(compound304.part, mode=Mode.SUBTRACT)


solid = cut158.part
